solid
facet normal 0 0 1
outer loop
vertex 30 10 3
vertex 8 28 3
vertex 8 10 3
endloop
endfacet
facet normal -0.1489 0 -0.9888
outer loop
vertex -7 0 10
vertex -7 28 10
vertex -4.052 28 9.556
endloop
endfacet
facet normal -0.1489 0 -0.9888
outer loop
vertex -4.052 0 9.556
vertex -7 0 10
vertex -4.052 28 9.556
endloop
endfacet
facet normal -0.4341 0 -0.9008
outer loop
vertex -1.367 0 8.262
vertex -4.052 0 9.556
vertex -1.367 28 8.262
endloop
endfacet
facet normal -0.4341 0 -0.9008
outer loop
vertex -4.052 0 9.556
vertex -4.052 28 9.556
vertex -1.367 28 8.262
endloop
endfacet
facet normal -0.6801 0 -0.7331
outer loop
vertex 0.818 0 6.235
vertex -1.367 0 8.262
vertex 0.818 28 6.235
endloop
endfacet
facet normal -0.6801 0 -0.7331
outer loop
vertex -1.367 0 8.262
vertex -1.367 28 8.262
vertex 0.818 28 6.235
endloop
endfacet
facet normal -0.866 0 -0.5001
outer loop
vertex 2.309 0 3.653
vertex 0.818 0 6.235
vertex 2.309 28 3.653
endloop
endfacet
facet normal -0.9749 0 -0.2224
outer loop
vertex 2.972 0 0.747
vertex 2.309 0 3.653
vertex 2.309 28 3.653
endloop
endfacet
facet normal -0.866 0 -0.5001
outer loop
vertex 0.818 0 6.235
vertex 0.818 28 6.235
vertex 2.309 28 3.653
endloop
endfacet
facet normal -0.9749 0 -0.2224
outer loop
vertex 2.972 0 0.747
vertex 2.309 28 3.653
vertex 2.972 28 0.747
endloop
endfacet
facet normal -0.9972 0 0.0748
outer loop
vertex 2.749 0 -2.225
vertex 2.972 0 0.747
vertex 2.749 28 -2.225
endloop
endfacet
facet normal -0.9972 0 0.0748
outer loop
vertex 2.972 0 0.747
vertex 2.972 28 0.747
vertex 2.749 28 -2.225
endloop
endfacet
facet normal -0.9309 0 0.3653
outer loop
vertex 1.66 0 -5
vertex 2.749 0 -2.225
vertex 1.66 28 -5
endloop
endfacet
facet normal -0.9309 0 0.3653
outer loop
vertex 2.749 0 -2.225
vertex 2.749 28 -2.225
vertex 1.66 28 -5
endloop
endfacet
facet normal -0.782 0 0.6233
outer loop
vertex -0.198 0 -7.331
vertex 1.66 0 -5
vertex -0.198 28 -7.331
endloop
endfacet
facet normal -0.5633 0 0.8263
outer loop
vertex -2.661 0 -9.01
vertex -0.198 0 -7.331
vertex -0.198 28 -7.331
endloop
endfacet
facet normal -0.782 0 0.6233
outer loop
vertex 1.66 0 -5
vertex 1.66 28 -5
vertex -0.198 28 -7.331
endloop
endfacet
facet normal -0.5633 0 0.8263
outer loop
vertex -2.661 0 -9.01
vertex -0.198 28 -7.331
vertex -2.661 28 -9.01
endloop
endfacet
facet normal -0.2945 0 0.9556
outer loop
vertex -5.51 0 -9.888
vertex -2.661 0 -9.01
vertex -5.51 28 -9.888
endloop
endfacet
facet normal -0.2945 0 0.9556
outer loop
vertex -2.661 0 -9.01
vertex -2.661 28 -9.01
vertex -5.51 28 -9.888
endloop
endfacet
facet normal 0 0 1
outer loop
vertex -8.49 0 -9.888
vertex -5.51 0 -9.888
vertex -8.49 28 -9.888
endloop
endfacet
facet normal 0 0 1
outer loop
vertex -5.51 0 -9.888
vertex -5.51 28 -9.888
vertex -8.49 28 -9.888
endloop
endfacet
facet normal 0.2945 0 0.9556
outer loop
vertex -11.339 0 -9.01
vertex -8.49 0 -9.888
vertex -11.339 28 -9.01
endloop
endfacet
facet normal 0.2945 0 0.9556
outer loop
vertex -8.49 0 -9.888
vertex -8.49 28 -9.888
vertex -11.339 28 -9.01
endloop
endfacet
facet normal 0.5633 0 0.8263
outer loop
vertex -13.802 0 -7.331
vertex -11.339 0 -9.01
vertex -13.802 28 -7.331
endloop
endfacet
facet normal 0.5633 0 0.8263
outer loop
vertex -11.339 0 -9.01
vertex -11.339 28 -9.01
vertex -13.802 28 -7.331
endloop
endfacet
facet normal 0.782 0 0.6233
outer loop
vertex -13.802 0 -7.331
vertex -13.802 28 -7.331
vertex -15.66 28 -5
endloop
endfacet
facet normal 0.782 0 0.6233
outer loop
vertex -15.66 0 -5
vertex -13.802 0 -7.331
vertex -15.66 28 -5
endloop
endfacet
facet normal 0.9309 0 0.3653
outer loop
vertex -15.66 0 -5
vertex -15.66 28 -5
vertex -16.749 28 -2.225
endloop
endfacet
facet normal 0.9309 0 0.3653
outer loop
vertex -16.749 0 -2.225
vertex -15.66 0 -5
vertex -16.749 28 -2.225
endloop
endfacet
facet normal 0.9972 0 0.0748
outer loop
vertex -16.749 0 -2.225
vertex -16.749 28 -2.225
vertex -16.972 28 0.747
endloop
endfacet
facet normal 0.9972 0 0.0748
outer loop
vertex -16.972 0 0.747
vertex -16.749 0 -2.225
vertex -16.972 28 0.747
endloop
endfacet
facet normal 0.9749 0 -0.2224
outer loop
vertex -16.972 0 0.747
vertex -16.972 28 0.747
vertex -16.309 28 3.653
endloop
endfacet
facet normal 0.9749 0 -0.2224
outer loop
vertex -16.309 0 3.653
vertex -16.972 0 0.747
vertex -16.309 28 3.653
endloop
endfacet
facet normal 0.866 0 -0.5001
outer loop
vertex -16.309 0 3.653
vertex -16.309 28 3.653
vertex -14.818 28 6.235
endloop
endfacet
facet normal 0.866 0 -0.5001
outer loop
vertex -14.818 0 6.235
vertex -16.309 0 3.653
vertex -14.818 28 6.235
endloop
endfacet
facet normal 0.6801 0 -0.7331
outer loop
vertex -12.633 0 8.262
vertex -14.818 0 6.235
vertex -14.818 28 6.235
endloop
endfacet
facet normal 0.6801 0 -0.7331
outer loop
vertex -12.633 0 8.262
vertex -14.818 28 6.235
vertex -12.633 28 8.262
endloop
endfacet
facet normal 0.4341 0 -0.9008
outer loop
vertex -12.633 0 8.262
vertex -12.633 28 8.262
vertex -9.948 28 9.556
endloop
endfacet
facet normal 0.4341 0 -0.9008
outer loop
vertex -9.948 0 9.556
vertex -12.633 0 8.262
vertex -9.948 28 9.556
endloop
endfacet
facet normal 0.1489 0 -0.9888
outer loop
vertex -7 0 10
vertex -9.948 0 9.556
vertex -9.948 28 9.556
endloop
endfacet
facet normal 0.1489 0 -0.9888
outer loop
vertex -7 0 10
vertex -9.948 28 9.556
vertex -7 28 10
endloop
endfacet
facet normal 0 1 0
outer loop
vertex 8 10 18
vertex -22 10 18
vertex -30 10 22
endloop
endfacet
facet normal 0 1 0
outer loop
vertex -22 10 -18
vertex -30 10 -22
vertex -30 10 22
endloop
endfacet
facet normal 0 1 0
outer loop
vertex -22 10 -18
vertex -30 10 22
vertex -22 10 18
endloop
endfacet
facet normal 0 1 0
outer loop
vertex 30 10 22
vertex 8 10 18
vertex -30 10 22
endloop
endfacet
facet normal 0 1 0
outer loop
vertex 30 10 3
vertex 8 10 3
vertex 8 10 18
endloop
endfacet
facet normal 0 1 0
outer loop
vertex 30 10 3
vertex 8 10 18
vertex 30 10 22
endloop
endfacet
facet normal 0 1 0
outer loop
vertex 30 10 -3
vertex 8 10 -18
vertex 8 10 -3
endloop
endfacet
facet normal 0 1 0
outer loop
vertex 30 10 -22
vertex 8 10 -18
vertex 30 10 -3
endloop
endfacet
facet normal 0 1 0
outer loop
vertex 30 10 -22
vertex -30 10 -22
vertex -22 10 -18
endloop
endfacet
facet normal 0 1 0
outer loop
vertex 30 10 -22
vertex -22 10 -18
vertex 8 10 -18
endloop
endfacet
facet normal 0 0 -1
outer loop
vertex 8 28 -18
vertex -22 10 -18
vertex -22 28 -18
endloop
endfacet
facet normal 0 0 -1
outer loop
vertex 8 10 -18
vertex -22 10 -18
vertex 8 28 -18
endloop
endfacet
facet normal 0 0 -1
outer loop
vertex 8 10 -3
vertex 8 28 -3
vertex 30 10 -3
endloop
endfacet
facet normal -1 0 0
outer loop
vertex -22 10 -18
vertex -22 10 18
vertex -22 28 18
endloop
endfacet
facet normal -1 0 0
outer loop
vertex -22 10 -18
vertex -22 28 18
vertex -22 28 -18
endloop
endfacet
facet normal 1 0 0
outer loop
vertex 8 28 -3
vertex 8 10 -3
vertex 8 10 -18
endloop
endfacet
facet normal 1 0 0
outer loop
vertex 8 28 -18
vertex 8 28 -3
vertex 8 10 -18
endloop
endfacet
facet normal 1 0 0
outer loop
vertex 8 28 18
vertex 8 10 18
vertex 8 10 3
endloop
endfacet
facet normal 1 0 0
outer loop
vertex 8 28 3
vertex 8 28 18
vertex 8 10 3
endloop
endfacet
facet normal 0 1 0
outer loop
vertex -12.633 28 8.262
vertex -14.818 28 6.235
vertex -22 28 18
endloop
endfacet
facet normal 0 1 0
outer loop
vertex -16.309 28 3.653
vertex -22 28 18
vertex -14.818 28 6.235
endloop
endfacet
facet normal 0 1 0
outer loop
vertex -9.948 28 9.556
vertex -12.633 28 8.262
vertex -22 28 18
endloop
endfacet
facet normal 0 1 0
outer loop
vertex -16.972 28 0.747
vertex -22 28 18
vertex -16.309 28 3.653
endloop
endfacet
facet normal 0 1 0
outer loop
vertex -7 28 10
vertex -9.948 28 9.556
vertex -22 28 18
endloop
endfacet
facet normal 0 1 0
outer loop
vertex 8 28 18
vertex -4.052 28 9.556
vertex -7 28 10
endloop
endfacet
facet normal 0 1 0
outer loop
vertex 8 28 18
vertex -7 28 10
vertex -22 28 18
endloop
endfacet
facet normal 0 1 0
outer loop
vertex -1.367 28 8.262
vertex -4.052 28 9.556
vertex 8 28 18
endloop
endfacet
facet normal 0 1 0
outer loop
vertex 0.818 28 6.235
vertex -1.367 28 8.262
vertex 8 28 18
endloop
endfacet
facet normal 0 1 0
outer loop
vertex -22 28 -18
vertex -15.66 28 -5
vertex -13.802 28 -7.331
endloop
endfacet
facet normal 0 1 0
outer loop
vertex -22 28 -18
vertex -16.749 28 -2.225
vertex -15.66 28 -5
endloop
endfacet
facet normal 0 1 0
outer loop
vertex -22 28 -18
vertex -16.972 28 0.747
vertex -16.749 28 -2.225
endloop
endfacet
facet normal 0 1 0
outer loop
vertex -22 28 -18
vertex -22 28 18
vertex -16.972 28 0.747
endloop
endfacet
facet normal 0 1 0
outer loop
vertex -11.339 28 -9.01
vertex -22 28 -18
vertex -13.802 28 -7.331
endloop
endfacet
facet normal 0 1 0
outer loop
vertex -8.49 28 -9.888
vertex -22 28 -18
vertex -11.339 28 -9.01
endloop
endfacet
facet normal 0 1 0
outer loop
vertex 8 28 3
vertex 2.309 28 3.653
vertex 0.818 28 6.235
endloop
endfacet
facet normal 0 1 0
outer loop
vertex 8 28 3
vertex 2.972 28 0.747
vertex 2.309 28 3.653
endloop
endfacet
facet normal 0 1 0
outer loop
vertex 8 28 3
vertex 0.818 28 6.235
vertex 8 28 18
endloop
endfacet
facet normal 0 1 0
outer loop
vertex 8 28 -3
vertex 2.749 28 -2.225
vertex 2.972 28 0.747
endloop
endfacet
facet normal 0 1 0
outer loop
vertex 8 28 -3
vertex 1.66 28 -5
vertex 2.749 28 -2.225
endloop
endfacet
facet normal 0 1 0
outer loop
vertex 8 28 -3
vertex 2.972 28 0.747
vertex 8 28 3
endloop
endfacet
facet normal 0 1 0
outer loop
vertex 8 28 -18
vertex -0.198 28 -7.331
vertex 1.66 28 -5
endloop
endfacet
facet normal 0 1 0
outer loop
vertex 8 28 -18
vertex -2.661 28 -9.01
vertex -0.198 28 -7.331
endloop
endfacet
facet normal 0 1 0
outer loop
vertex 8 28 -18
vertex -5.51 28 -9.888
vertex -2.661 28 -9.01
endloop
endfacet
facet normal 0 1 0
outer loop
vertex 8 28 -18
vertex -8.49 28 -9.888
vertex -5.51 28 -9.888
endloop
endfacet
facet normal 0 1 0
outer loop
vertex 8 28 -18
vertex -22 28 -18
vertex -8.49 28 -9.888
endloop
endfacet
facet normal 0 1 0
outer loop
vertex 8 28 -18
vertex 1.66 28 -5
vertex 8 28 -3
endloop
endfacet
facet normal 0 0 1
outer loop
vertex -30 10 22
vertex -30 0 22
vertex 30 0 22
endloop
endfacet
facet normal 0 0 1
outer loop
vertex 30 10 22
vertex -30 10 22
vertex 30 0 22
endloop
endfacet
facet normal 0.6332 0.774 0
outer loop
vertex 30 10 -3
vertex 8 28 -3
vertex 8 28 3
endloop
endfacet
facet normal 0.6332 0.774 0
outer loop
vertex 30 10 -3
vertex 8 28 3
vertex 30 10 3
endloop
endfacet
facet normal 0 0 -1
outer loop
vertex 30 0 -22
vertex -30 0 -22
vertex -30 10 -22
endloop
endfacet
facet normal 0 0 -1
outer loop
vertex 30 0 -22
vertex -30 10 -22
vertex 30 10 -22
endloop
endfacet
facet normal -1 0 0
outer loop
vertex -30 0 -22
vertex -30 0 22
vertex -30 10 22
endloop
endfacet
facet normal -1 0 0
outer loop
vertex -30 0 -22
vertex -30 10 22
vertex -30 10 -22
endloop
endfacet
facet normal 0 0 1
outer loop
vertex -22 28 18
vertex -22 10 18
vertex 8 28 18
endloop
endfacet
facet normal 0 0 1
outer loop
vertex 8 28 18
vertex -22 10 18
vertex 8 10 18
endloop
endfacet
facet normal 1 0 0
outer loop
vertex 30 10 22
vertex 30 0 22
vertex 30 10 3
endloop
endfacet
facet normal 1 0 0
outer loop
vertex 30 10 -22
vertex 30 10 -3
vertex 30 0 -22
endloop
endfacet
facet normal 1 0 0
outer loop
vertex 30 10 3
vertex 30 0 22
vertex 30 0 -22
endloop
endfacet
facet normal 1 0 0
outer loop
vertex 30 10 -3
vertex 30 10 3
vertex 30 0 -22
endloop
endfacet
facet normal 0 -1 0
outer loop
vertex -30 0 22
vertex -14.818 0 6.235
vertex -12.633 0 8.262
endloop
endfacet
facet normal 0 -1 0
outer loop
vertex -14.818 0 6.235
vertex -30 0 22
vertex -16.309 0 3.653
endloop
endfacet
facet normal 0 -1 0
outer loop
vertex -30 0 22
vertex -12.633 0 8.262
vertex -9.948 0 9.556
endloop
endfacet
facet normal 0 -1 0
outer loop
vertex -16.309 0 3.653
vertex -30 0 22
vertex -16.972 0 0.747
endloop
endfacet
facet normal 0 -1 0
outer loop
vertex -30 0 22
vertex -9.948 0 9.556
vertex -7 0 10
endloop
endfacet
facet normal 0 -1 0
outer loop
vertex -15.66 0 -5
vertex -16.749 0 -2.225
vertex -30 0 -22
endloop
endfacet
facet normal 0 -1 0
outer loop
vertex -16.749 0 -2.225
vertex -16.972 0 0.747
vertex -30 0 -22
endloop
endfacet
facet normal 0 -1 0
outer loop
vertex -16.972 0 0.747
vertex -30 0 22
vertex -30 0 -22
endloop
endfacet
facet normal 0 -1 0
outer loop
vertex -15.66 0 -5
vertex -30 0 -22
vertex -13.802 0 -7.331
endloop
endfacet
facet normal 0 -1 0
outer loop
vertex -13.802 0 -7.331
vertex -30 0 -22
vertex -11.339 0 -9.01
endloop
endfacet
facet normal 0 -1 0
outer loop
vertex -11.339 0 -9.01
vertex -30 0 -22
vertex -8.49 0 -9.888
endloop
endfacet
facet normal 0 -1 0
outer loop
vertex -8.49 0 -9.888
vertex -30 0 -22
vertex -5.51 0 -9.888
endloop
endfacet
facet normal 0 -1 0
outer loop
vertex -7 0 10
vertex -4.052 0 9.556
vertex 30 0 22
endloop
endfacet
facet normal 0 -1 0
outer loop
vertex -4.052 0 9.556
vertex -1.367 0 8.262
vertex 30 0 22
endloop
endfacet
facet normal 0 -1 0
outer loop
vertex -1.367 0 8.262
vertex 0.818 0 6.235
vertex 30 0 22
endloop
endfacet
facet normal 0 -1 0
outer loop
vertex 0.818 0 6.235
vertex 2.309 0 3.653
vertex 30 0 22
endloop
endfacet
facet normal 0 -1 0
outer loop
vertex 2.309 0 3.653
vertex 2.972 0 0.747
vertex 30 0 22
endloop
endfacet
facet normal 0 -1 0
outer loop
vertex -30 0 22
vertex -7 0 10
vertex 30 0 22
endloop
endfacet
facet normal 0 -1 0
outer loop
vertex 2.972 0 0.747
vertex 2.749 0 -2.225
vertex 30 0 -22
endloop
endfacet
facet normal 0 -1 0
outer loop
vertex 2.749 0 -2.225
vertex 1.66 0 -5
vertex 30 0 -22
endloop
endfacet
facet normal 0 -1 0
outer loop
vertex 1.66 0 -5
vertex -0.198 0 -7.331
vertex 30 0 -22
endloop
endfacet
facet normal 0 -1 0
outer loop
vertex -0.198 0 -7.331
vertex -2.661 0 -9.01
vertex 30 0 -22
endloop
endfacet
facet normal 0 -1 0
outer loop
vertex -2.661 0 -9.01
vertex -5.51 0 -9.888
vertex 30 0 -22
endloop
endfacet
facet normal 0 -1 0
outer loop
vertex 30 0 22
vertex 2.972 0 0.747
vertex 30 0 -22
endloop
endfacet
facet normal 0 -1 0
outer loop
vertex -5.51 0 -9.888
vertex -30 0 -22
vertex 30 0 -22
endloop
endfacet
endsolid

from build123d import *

# Parameters (mm, degrees)
SKETCH_1_W          = 60
SKETCH_1_H          = 44
EXTRUDE_1_DEPTH     = 10
SKETCH_2_W          = 30
SKETCH_2_H          = 36
EXTRUDE_2_DEPTH     = 18
SKETCH_3_R          = 10
CUT_EXTRUDE_1_DEPTH = 47.561786907
RIB_1_REACH         = 48.562
SKETCH_5_WALL_W     = 123.548914622
SKETCH_5_WALL_H     = 6


with BuildPart() as part:
    # 草图1 → 凸台-拉伸1 (new body)
    with BuildSketch(Plane(origin=(0, 0, 0), x_dir=(1, 0, 0), z_dir=(0, 1, 0))):
        Rectangle(SKETCH_1_W, SKETCH_1_H)
    extrude(amount=EXTRUDE_1_DEPTH)

    # 草图2 → 凸台-拉伸2 (add)
    with BuildSketch(Plane(origin=(0, 10, 0), x_dir=(1, 0, 0), z_dir=(0, 1, 0))):
        with Locations((-7, 0)):
            Rectangle(SKETCH_2_W, SKETCH_2_H)
    extrude(amount=EXTRUDE_2_DEPTH)

    # 草图3 → 切除-拉伸1 (cut, through all)
    with BuildSketch(Plane(origin=(0, 28, 0), x_dir=(1, 0, 0), z_dir=(0, 1, 0))):
        with Locations(Location((-7, 0, 0), (0, 0, 270))):
            Circle(SKETCH_3_R)
    extrude(amount=-CUT_EXTRUDE_1_DEPTH, mode=Mode.SUBTRACT)

    # 草图5 wall → 筋1 (add, up to next)
    with BuildSketch(Plane(origin=(19, 19, 0), x_dir=(0.773957299203, -0.633237790257, 0), z_dir=(0.633237790257, 0.773957299203, 0)), mode=Mode.PRIVATE) as rib_1_sk1:
        Rectangle(SKETCH_5_WALL_W, SKETCH_5_WALL_H)
    rib_1_tool1 = extrude(rib_1_sk1.sketch, amount=-RIB_1_REACH, mode=Mode.PRIVATE) - part.part
    add(rib_1_tool1.solids().sort_by_distance((19, 19, 0))[0])


solid = part.part
